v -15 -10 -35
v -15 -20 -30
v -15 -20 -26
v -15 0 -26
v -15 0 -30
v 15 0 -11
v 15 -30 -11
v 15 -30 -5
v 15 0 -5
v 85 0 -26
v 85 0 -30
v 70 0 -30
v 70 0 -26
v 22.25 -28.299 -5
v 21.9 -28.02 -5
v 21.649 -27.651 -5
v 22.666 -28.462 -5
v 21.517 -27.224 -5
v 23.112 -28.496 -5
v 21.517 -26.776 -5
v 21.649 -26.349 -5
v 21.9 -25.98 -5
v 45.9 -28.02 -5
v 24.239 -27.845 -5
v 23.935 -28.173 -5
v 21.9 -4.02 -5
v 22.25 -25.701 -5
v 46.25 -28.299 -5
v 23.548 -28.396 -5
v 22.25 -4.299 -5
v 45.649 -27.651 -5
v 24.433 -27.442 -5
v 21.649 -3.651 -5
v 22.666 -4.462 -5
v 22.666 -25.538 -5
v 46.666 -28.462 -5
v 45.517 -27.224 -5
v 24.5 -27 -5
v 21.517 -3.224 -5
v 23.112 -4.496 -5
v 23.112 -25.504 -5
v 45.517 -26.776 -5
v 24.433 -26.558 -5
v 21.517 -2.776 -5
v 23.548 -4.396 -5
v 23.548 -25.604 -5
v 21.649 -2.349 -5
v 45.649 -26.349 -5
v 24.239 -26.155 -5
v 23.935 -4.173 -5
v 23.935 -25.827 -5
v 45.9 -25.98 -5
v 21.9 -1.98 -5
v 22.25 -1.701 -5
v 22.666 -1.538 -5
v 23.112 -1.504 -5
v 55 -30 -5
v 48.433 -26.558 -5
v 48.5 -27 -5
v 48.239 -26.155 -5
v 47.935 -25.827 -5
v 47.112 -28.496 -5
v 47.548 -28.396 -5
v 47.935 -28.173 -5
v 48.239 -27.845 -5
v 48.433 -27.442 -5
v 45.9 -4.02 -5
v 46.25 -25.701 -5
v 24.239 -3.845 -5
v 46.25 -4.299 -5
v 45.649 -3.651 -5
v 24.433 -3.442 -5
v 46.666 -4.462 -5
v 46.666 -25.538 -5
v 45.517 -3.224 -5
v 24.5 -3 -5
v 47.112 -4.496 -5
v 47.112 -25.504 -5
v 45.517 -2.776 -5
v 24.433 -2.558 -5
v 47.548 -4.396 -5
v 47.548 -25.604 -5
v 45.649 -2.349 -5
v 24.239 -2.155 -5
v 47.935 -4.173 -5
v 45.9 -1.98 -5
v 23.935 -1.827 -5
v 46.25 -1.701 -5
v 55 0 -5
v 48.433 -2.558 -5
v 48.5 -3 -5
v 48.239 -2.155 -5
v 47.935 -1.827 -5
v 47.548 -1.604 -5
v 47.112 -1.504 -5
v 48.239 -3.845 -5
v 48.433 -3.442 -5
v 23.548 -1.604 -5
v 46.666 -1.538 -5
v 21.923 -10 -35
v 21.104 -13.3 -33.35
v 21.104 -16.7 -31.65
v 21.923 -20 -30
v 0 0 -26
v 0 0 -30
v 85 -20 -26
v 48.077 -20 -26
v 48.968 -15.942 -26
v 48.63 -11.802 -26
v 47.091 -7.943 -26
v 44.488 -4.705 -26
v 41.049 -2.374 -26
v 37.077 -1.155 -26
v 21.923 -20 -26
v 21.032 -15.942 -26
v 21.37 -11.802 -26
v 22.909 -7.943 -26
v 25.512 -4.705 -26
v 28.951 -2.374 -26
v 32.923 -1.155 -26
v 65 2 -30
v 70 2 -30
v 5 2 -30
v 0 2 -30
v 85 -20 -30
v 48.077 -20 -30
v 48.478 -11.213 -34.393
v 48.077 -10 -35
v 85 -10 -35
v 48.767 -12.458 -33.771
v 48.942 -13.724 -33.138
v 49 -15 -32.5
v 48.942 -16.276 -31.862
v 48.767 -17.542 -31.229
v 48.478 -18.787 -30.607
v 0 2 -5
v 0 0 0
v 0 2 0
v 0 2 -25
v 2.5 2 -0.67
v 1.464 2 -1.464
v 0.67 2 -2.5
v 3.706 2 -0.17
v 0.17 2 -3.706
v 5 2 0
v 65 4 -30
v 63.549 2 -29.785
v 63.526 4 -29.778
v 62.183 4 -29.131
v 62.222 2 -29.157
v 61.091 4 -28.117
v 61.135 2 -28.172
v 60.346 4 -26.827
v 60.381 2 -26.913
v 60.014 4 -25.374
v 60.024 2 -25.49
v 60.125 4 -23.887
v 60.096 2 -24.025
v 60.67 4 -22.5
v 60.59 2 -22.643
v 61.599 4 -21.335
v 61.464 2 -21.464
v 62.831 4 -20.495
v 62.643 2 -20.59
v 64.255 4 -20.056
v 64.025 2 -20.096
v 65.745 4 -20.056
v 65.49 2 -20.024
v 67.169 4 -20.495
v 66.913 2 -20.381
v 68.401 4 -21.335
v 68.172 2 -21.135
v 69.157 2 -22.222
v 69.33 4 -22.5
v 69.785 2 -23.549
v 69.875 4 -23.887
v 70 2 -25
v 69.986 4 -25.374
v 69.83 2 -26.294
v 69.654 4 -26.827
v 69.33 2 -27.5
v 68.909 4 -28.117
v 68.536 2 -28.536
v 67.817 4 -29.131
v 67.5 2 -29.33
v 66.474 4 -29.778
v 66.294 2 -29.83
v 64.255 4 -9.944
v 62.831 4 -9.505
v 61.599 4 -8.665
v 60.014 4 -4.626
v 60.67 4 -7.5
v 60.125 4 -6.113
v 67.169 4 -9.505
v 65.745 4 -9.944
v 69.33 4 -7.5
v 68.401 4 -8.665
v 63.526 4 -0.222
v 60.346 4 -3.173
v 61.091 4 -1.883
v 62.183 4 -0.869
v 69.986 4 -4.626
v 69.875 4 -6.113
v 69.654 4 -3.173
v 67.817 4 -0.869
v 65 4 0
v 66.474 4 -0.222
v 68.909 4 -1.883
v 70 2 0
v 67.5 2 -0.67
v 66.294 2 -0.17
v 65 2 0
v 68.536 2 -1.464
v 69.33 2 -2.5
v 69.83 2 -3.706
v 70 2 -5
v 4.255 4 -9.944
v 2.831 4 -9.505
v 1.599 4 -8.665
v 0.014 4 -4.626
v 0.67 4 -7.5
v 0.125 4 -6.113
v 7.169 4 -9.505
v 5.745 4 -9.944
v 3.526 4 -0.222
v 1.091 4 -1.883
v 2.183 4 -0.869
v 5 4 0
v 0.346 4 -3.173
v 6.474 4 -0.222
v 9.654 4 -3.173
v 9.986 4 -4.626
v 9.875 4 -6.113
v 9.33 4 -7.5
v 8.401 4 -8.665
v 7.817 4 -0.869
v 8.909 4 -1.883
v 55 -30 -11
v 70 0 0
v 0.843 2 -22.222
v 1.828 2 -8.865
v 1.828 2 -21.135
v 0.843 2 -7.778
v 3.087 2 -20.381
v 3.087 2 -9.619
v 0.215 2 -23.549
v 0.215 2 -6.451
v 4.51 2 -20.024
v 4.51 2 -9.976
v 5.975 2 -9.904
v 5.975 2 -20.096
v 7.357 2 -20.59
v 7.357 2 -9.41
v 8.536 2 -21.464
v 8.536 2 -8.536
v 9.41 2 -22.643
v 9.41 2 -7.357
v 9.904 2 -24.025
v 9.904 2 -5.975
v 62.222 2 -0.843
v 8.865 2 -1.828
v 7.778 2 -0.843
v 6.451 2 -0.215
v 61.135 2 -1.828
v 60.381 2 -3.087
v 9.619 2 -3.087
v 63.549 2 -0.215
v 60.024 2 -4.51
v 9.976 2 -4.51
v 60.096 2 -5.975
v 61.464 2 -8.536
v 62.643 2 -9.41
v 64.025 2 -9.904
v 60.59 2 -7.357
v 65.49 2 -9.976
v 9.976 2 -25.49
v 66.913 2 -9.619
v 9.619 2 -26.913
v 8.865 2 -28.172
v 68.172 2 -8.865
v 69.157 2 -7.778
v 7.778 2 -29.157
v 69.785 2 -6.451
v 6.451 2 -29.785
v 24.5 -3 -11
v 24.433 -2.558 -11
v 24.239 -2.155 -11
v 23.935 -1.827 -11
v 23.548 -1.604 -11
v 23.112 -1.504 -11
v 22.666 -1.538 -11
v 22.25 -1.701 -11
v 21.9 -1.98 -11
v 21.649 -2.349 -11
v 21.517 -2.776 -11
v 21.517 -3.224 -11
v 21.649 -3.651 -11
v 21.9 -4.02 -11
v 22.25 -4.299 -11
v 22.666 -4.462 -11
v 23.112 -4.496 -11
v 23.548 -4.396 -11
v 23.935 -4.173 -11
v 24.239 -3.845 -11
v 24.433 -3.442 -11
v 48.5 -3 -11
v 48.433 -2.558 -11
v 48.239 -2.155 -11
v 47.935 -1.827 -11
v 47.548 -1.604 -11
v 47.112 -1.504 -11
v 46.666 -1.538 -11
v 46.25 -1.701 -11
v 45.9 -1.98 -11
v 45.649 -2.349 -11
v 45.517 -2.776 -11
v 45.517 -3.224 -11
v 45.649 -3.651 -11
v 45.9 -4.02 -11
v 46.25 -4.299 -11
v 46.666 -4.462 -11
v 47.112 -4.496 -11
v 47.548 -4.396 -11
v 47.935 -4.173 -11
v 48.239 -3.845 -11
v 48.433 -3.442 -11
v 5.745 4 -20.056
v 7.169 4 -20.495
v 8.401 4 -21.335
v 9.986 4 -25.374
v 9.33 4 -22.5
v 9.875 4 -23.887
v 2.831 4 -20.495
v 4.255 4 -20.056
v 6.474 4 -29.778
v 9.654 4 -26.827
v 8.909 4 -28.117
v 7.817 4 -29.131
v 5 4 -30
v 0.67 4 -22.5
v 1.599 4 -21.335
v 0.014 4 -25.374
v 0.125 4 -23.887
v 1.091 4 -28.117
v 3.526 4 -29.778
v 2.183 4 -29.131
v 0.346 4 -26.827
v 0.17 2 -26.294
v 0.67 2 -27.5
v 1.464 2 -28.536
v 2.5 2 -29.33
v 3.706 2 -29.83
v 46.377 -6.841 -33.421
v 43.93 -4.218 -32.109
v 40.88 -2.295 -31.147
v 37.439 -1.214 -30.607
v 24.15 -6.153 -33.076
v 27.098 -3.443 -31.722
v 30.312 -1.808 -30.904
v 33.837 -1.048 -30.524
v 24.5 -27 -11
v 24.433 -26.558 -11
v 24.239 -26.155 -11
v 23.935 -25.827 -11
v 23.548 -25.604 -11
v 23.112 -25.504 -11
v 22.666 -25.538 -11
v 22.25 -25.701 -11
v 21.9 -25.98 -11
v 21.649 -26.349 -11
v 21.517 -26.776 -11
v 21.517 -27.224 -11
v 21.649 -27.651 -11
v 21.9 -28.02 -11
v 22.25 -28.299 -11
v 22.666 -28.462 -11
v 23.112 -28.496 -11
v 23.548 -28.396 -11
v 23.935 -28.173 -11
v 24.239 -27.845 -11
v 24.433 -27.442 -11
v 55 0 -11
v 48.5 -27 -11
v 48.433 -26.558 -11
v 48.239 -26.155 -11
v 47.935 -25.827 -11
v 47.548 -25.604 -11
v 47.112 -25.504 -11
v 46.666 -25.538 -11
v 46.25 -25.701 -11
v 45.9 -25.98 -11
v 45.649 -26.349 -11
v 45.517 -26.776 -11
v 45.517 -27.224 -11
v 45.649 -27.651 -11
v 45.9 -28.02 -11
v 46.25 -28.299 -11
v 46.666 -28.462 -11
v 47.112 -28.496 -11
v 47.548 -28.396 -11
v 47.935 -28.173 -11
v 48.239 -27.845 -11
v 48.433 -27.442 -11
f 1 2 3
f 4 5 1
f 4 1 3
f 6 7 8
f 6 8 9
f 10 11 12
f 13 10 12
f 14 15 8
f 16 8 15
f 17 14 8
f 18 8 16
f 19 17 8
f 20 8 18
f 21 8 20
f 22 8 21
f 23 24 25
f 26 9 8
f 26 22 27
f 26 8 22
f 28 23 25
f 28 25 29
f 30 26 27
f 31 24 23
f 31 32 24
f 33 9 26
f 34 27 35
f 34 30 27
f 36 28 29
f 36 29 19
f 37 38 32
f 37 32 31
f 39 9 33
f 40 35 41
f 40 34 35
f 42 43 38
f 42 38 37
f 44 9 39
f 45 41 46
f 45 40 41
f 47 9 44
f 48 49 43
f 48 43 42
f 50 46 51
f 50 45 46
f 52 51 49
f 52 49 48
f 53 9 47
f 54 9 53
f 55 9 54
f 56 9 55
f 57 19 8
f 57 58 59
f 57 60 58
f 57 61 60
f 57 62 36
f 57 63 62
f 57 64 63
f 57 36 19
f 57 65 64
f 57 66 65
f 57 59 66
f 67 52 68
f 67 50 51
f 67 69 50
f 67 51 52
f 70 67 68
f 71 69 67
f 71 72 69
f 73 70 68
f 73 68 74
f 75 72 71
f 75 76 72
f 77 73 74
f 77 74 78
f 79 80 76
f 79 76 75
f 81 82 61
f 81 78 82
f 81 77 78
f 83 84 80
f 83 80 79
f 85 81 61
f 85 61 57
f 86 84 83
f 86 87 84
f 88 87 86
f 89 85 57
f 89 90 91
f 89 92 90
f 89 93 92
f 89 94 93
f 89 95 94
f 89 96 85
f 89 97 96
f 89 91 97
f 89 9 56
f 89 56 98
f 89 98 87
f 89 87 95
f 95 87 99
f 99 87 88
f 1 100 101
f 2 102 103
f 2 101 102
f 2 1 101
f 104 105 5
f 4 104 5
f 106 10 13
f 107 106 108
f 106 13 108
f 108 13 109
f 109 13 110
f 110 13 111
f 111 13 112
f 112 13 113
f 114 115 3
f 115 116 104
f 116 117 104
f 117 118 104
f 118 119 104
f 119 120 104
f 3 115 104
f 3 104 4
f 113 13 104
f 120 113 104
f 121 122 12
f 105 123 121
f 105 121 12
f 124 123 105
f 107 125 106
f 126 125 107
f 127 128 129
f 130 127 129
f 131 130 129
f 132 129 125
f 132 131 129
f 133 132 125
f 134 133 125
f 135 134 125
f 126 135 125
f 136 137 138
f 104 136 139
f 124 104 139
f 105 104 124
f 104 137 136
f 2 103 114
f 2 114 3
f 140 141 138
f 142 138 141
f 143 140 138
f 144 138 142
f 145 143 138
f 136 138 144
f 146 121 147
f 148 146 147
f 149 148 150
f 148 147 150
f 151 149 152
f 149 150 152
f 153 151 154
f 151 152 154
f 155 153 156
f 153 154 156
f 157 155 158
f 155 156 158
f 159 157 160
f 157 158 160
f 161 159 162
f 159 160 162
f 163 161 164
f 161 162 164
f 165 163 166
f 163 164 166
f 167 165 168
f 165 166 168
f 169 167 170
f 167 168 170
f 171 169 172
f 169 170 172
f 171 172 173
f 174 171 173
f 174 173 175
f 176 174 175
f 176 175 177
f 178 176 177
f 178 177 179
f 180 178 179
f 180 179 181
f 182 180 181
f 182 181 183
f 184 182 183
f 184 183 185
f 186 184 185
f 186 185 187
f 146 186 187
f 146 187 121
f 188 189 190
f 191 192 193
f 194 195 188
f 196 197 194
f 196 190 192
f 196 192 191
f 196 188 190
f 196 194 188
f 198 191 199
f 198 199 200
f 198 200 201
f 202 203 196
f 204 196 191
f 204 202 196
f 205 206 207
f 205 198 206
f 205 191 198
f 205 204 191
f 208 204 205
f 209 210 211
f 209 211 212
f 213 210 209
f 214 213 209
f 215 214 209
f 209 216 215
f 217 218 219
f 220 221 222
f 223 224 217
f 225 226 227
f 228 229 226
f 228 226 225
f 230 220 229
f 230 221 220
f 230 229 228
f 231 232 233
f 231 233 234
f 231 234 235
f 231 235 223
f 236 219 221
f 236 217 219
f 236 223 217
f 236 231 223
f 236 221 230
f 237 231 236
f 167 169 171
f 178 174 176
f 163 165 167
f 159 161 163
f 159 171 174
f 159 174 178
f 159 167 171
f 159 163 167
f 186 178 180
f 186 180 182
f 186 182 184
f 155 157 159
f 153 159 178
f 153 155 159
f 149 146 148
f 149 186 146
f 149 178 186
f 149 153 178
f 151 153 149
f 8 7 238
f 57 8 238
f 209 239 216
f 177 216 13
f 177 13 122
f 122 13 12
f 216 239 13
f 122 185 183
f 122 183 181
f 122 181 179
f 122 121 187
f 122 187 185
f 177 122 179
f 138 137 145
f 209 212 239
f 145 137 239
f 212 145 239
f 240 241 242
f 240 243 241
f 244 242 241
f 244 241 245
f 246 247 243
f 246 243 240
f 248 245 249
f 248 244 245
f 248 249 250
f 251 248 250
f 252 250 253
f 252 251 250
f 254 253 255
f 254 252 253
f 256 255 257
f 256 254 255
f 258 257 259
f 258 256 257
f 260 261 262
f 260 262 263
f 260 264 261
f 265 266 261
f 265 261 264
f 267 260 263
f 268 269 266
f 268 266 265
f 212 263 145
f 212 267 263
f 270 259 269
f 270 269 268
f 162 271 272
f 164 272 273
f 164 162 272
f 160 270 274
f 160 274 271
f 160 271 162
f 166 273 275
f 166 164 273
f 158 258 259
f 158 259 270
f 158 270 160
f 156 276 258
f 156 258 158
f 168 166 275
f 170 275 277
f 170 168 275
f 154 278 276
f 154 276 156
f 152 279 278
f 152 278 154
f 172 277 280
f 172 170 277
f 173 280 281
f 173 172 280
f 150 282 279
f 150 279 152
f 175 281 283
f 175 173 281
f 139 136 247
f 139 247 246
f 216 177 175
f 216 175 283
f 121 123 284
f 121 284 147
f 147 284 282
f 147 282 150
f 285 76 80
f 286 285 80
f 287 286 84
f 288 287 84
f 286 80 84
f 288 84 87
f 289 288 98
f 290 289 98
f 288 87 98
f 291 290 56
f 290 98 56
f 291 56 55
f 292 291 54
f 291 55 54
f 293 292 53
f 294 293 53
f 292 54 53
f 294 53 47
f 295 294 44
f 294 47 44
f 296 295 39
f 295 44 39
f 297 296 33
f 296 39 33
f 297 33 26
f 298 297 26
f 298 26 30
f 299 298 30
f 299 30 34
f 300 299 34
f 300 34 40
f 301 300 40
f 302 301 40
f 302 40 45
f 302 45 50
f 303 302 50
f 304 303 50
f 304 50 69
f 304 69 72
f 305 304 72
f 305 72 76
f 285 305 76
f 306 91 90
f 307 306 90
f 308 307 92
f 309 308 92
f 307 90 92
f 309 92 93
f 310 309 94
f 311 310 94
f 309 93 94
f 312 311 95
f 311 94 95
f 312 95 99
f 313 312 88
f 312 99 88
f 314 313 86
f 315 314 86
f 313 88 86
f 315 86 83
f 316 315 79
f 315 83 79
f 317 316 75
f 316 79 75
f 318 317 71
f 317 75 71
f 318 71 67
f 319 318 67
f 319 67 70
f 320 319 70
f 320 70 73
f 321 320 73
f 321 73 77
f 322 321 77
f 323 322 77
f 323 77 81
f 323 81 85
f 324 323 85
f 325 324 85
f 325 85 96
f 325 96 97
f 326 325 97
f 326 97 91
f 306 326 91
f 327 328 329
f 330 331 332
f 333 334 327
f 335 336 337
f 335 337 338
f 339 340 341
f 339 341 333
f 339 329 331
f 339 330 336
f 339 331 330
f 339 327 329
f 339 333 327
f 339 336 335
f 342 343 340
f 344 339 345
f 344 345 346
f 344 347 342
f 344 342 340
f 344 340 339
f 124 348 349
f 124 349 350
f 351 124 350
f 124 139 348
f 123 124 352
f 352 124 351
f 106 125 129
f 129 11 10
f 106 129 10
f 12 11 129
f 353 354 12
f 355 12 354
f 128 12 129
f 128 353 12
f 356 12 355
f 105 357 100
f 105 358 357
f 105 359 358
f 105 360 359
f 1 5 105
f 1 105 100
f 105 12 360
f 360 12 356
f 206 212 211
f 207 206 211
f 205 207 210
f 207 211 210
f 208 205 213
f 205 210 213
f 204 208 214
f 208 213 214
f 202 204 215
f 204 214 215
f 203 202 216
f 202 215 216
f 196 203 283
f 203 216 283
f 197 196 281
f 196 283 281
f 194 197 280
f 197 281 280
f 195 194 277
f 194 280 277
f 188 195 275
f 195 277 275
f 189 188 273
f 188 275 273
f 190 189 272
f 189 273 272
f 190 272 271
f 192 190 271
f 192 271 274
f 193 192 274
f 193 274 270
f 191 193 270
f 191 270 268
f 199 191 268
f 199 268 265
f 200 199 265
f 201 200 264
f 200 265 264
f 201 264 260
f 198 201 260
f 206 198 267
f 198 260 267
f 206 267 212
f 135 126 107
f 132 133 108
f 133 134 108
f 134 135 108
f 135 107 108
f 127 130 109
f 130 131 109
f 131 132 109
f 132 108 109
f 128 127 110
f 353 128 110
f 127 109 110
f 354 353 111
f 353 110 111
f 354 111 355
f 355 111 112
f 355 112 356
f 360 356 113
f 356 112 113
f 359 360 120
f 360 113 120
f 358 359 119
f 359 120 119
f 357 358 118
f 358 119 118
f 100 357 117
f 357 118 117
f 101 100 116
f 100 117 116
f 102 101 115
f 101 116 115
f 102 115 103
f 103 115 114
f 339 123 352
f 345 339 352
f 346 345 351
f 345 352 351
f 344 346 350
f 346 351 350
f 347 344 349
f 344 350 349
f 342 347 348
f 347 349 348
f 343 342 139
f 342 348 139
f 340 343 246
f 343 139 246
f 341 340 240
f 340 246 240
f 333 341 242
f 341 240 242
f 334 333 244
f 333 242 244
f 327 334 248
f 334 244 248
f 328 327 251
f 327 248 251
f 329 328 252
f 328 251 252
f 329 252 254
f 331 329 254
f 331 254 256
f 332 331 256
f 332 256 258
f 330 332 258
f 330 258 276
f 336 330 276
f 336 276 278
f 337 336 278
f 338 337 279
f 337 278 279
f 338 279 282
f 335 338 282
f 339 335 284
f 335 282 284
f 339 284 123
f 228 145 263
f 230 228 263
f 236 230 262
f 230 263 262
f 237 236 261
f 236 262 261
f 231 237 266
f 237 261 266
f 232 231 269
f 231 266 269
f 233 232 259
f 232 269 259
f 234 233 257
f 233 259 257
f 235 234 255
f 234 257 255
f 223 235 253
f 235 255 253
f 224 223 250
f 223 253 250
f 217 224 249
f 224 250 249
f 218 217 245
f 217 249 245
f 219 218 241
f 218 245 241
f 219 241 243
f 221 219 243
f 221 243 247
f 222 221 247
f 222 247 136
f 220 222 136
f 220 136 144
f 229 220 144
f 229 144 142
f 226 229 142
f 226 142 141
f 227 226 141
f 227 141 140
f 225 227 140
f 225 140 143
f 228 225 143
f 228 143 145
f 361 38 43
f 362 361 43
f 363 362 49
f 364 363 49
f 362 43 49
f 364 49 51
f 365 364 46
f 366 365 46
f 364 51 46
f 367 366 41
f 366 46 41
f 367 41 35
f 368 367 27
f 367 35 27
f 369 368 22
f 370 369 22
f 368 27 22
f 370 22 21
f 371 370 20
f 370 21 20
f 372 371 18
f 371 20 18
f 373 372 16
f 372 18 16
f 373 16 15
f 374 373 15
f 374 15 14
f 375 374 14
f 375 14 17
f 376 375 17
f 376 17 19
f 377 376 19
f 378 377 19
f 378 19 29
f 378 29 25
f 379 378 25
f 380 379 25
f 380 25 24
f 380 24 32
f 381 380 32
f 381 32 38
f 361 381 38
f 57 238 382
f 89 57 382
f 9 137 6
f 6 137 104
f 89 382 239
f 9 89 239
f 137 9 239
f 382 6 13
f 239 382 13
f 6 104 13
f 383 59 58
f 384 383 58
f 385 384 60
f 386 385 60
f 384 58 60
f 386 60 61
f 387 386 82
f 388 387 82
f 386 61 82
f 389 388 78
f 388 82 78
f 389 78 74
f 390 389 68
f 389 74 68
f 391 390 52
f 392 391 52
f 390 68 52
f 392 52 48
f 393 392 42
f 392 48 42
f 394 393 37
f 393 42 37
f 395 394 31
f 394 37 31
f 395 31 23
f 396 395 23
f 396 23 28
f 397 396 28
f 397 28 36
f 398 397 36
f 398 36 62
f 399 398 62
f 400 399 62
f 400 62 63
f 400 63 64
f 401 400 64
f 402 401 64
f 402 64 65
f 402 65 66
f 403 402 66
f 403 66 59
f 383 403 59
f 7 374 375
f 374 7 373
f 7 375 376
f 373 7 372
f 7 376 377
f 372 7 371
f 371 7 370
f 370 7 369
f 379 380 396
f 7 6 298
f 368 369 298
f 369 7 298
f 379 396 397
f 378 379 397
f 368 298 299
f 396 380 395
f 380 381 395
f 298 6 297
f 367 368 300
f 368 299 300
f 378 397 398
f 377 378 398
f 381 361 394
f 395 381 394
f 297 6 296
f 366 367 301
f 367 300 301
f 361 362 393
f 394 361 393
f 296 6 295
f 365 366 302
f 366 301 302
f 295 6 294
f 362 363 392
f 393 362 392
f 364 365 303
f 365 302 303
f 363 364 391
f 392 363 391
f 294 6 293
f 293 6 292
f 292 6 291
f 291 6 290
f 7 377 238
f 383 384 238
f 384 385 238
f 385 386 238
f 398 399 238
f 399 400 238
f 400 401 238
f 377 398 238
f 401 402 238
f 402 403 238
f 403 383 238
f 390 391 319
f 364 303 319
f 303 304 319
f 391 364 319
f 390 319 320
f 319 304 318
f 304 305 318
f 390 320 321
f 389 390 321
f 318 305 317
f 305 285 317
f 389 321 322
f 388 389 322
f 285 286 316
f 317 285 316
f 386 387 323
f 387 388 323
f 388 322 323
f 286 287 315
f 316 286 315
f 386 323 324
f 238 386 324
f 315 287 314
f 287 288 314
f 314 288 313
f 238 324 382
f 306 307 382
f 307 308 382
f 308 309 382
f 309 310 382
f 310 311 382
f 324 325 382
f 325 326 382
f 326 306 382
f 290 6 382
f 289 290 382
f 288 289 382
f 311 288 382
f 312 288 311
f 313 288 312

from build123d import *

# Parameters (mm, degrees)
SKETCH_1_W          = 70
SKETCH_1_H          = 30
EXTRUDE_1_DEPTH     = 2
SKETCH_2_R          = 5
EXTRUDE_2_DEPTH     = 4
SKETCH_3_W          = 100
SKETCH_3_H          = 20
EXTRUDE_3_DEPTH     = 4
EXTRUDE_5_DEPTH     = 100
SKETCH_7_W          = 40
SKETCH_7_H          = 30
EXTRUDE_7_DEPTH     = 6
CUT_EXTRUDE_1_REACH = 97
SKETCH_8_R          = 1.5
CUT_EXTRUDE_2_REACH = 95.814
SKETCH_10_R         = 14


with BuildPart() as part:
    # 草图1 → 凸台-拉伸1 (new body)
    with BuildSketch(Plane(origin=(0, 0, 0), x_dir=(1, 0, 0), z_dir=(0, 1, 0))):
        with Locations((35, 15)):
            Rectangle(SKETCH_1_W, SKETCH_1_H)
    extrude(amount=EXTRUDE_1_DEPTH)

    # 草图2 → 凸台-拉伸2 (add)
    with BuildSketch(Plane(origin=(0, 0, 0), x_dir=(1, 0, 0), z_dir=(0, 1, 0))):
        with Locations(Location((5, 25, 0), (0, 0, 90))):
            Circle(SKETCH_2_R)
        with Locations(Location((5, 5, 0), (0, 0, 270))):
            Circle(SKETCH_2_R)
        with Locations(Location((65, 25, 0), (0, 0, 90))):
            Circle(SKETCH_2_R)
        with Locations(Location((65, 5, 0), (0, 0, 270))):
            Circle(SKETCH_2_R)
    extrude(amount=EXTRUDE_2_DEPTH)

    # 草图3 → 凸台-拉伸3 (add)
    with BuildSketch(Plane(origin=(0, 0, -30), x_dir=(-1, 0, 0), z_dir=(0, 0, -1))):
        with Locations((-35, -10)):
            Rectangle(SKETCH_3_W, SKETCH_3_H)
    extrude(amount=-EXTRUDE_3_DEPTH)

    # 草图5 → 凸台-拉伸5 (add)
    with BuildSketch(Plane.ZY.offset(15)):
        Polygon((-30, 0), (-35, -10), (-30, -20), align=None)
    extrude(amount=-EXTRUDE_5_DEPTH)

    # 草图7 → 凸台-拉伸7 (add)
    with BuildSketch(Plane.XY.offset(-11)):
        with Locations((35, -15)):
            Rectangle(SKETCH_7_W, SKETCH_7_H)
    extrude(amount=EXTRUDE_7_DEPTH)

    # 草图8 → 切除-拉伸1 (cut, up to next)
    with BuildSketch(Plane.XY.offset(-5), mode=Mode.PRIVATE) as cut_extrude_1_sk1:
        with Locations((23, -3)):
            Circle(SKETCH_8_R)
    cut_extrude_1_tool1 = extrude(cut_extrude_1_sk1.sketch, amount=-CUT_EXTRUDE_1_REACH, mode=Mode.PRIVATE) & part.part
    # 草图8 → 切除-拉伸1 (cut, up to next)
    with BuildSketch(Plane.XY.offset(-5), mode=Mode.PRIVATE) as cut_extrude_1_sk2:
        with Locations((47, -3)):
            Circle(SKETCH_8_R)
    cut_extrude_1_tool2 = extrude(cut_extrude_1_sk2.sketch, amount=-CUT_EXTRUDE_1_REACH, mode=Mode.PRIVATE) & part.part
    # 草图8 → 切除-拉伸1 (cut, up to next)
    with BuildSketch(Plane.XY.offset(-5), mode=Mode.PRIVATE) as cut_extrude_1_sk3:
        with Locations((23, -27)):
            Circle(SKETCH_8_R)
    cut_extrude_1_tool3 = extrude(cut_extrude_1_sk3.sketch, amount=-CUT_EXTRUDE_1_REACH, mode=Mode.PRIVATE) & part.part
    # 草图8 → 切除-拉伸1 (cut, up to next)
    with BuildSketch(Plane.XY.offset(-5), mode=Mode.PRIVATE) as cut_extrude_1_sk4:
        with Locations((47, -27)):
            Circle(SKETCH_8_R)
    cut_extrude_1_tool4 = extrude(cut_extrude_1_sk4.sketch, amount=-CUT_EXTRUDE_1_REACH, mode=Mode.PRIVATE) & part.part
    add(cut_extrude_1_tool1.solids().sort_by_distance((23, -3, -5))[0], mode=Mode.SUBTRACT)
    add(cut_extrude_1_tool2.solids().sort_by_distance((47, -3, -5))[0], mode=Mode.SUBTRACT)
    add(cut_extrude_1_tool3.solids().sort_by_distance((23, -27, -5))[0], mode=Mode.SUBTRACT)
    add(cut_extrude_1_tool4.solids().sort_by_distance((47, -27, -5))[0], mode=Mode.SUBTRACT)

    # 草图10 → 切除-拉伸2 (cut, up to next)
    with BuildSketch(Plane.XY.offset(-26), mode=Mode.PRIVATE) as cut_extrude_2_sk1:
        with Locations((35, -15)):
            Circle(SKETCH_10_R)
    cut_extrude_2_tool1 = extrude(cut_extrude_2_sk1.sketch, amount=-CUT_EXTRUDE_2_REACH, mode=Mode.PRIVATE) & part.part
    add(cut_extrude_2_tool1.solids().sort_by_distance((35, -15, -26))[0], mode=Mode.SUBTRACT)


solid = part.part
